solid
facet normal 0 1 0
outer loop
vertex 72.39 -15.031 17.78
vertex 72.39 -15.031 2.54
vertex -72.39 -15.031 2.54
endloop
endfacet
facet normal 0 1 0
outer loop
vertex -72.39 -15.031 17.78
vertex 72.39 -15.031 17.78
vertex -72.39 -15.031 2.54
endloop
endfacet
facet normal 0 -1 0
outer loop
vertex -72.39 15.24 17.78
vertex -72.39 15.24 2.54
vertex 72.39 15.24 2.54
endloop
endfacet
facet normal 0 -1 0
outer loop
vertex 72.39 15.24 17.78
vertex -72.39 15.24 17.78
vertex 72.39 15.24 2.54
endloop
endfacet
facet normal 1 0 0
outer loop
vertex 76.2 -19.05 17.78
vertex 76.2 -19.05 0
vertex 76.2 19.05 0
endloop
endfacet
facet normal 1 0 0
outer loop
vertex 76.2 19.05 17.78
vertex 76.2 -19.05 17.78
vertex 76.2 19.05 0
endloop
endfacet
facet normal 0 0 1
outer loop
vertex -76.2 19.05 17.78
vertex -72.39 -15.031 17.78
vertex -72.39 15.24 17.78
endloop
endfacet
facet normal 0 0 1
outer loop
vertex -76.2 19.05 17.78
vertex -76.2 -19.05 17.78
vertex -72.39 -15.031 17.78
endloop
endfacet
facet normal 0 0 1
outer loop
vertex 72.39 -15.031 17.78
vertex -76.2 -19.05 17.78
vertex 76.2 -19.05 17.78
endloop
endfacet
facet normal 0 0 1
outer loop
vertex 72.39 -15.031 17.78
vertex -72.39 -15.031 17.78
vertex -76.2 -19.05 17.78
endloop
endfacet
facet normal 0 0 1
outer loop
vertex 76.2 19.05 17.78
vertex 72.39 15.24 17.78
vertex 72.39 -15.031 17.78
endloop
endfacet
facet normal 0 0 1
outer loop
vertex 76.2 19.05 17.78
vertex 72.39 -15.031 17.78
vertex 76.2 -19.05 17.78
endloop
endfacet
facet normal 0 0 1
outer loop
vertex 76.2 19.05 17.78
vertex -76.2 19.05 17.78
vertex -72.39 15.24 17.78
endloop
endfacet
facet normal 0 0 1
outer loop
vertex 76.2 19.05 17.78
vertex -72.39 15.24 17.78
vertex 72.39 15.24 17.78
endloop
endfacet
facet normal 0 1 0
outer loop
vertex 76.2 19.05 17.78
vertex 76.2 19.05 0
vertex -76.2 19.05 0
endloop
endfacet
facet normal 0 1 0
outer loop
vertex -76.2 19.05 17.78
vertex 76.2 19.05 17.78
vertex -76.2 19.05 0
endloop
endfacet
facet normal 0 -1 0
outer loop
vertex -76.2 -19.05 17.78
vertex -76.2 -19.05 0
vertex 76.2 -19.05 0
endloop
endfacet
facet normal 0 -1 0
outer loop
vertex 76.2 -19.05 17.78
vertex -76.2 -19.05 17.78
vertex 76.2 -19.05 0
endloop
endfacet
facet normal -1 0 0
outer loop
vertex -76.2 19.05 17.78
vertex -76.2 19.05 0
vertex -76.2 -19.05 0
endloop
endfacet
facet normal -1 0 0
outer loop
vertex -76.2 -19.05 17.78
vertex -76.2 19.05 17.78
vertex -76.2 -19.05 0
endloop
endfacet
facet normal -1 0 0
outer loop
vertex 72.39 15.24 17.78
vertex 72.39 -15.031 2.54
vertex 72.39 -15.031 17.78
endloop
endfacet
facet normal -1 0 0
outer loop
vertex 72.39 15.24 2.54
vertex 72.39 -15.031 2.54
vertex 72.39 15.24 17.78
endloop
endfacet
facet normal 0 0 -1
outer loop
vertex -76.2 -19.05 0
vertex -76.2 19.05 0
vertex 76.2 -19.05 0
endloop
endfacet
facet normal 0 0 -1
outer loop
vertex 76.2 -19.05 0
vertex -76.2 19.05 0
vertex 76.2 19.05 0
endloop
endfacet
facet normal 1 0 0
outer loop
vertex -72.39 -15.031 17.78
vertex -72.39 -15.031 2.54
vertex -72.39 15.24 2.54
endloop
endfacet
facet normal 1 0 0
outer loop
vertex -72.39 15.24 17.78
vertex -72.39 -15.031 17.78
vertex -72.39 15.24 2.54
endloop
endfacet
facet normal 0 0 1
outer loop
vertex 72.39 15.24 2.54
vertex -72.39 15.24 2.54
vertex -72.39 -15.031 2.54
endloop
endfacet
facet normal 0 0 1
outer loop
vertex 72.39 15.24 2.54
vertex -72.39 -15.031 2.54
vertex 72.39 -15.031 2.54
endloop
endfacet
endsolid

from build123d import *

# Parameters (mm, degrees)
F0_W     = 3.81
F0_H     = 3.81
F0_H_2   = 30.2708674201
F0_H_3   = 4.0191325799
F1_DEPTH = 17.78
F2_W     = 152.4
F2_H     = 38.1
F3_DEPTH = 2.54


with BuildPart() as f1:
    # F0 (on Top) → F1 (new body)
    with BuildSketch(Plane.XY):
        Polygon((-72.39, 15.24), (72.39, 15.24), (72.39, 19.05), (-68.58, 19.05), (-72.39, 19.05), align=None)
        with Locations((-74.295, 17.145)):
            Rectangle(F0_W, F0_H)
        with Locations((-74.295, 0.1045662899)):
            Rectangle(F0_W, F0_H_2)
        with Locations((-74.295, -17.0404337101)):
            Rectangle(F0_W, F0_H_3)
        Polygon((-71.3768037915, -19.05), (72.39, -19.05), (72.39, -15.0308674201), (-72.39, -15.0308674201), (-72.39, -19.05), align=None)
        with Locations((74.295, 0.1045662899)):
            Rectangle(F0_W, F0_H_2)
        Polygon((72.39, -19.05), (76.2, -19.05), (76.2, -18.8408674201), (76.2, -15.0308674201), (72.39, -15.0308674201), align=None)
        with Locations((74.295, 17.145)):
            Rectangle(F0_W, F0_H)
    extrude(amount=F1_DEPTH)

    # F2 (on Top) → F3 (join)
    with BuildSketch(Plane.XY):
        Rectangle(F2_W, F2_H)
    extrude(amount=F3_DEPTH)


solid = f1.part
